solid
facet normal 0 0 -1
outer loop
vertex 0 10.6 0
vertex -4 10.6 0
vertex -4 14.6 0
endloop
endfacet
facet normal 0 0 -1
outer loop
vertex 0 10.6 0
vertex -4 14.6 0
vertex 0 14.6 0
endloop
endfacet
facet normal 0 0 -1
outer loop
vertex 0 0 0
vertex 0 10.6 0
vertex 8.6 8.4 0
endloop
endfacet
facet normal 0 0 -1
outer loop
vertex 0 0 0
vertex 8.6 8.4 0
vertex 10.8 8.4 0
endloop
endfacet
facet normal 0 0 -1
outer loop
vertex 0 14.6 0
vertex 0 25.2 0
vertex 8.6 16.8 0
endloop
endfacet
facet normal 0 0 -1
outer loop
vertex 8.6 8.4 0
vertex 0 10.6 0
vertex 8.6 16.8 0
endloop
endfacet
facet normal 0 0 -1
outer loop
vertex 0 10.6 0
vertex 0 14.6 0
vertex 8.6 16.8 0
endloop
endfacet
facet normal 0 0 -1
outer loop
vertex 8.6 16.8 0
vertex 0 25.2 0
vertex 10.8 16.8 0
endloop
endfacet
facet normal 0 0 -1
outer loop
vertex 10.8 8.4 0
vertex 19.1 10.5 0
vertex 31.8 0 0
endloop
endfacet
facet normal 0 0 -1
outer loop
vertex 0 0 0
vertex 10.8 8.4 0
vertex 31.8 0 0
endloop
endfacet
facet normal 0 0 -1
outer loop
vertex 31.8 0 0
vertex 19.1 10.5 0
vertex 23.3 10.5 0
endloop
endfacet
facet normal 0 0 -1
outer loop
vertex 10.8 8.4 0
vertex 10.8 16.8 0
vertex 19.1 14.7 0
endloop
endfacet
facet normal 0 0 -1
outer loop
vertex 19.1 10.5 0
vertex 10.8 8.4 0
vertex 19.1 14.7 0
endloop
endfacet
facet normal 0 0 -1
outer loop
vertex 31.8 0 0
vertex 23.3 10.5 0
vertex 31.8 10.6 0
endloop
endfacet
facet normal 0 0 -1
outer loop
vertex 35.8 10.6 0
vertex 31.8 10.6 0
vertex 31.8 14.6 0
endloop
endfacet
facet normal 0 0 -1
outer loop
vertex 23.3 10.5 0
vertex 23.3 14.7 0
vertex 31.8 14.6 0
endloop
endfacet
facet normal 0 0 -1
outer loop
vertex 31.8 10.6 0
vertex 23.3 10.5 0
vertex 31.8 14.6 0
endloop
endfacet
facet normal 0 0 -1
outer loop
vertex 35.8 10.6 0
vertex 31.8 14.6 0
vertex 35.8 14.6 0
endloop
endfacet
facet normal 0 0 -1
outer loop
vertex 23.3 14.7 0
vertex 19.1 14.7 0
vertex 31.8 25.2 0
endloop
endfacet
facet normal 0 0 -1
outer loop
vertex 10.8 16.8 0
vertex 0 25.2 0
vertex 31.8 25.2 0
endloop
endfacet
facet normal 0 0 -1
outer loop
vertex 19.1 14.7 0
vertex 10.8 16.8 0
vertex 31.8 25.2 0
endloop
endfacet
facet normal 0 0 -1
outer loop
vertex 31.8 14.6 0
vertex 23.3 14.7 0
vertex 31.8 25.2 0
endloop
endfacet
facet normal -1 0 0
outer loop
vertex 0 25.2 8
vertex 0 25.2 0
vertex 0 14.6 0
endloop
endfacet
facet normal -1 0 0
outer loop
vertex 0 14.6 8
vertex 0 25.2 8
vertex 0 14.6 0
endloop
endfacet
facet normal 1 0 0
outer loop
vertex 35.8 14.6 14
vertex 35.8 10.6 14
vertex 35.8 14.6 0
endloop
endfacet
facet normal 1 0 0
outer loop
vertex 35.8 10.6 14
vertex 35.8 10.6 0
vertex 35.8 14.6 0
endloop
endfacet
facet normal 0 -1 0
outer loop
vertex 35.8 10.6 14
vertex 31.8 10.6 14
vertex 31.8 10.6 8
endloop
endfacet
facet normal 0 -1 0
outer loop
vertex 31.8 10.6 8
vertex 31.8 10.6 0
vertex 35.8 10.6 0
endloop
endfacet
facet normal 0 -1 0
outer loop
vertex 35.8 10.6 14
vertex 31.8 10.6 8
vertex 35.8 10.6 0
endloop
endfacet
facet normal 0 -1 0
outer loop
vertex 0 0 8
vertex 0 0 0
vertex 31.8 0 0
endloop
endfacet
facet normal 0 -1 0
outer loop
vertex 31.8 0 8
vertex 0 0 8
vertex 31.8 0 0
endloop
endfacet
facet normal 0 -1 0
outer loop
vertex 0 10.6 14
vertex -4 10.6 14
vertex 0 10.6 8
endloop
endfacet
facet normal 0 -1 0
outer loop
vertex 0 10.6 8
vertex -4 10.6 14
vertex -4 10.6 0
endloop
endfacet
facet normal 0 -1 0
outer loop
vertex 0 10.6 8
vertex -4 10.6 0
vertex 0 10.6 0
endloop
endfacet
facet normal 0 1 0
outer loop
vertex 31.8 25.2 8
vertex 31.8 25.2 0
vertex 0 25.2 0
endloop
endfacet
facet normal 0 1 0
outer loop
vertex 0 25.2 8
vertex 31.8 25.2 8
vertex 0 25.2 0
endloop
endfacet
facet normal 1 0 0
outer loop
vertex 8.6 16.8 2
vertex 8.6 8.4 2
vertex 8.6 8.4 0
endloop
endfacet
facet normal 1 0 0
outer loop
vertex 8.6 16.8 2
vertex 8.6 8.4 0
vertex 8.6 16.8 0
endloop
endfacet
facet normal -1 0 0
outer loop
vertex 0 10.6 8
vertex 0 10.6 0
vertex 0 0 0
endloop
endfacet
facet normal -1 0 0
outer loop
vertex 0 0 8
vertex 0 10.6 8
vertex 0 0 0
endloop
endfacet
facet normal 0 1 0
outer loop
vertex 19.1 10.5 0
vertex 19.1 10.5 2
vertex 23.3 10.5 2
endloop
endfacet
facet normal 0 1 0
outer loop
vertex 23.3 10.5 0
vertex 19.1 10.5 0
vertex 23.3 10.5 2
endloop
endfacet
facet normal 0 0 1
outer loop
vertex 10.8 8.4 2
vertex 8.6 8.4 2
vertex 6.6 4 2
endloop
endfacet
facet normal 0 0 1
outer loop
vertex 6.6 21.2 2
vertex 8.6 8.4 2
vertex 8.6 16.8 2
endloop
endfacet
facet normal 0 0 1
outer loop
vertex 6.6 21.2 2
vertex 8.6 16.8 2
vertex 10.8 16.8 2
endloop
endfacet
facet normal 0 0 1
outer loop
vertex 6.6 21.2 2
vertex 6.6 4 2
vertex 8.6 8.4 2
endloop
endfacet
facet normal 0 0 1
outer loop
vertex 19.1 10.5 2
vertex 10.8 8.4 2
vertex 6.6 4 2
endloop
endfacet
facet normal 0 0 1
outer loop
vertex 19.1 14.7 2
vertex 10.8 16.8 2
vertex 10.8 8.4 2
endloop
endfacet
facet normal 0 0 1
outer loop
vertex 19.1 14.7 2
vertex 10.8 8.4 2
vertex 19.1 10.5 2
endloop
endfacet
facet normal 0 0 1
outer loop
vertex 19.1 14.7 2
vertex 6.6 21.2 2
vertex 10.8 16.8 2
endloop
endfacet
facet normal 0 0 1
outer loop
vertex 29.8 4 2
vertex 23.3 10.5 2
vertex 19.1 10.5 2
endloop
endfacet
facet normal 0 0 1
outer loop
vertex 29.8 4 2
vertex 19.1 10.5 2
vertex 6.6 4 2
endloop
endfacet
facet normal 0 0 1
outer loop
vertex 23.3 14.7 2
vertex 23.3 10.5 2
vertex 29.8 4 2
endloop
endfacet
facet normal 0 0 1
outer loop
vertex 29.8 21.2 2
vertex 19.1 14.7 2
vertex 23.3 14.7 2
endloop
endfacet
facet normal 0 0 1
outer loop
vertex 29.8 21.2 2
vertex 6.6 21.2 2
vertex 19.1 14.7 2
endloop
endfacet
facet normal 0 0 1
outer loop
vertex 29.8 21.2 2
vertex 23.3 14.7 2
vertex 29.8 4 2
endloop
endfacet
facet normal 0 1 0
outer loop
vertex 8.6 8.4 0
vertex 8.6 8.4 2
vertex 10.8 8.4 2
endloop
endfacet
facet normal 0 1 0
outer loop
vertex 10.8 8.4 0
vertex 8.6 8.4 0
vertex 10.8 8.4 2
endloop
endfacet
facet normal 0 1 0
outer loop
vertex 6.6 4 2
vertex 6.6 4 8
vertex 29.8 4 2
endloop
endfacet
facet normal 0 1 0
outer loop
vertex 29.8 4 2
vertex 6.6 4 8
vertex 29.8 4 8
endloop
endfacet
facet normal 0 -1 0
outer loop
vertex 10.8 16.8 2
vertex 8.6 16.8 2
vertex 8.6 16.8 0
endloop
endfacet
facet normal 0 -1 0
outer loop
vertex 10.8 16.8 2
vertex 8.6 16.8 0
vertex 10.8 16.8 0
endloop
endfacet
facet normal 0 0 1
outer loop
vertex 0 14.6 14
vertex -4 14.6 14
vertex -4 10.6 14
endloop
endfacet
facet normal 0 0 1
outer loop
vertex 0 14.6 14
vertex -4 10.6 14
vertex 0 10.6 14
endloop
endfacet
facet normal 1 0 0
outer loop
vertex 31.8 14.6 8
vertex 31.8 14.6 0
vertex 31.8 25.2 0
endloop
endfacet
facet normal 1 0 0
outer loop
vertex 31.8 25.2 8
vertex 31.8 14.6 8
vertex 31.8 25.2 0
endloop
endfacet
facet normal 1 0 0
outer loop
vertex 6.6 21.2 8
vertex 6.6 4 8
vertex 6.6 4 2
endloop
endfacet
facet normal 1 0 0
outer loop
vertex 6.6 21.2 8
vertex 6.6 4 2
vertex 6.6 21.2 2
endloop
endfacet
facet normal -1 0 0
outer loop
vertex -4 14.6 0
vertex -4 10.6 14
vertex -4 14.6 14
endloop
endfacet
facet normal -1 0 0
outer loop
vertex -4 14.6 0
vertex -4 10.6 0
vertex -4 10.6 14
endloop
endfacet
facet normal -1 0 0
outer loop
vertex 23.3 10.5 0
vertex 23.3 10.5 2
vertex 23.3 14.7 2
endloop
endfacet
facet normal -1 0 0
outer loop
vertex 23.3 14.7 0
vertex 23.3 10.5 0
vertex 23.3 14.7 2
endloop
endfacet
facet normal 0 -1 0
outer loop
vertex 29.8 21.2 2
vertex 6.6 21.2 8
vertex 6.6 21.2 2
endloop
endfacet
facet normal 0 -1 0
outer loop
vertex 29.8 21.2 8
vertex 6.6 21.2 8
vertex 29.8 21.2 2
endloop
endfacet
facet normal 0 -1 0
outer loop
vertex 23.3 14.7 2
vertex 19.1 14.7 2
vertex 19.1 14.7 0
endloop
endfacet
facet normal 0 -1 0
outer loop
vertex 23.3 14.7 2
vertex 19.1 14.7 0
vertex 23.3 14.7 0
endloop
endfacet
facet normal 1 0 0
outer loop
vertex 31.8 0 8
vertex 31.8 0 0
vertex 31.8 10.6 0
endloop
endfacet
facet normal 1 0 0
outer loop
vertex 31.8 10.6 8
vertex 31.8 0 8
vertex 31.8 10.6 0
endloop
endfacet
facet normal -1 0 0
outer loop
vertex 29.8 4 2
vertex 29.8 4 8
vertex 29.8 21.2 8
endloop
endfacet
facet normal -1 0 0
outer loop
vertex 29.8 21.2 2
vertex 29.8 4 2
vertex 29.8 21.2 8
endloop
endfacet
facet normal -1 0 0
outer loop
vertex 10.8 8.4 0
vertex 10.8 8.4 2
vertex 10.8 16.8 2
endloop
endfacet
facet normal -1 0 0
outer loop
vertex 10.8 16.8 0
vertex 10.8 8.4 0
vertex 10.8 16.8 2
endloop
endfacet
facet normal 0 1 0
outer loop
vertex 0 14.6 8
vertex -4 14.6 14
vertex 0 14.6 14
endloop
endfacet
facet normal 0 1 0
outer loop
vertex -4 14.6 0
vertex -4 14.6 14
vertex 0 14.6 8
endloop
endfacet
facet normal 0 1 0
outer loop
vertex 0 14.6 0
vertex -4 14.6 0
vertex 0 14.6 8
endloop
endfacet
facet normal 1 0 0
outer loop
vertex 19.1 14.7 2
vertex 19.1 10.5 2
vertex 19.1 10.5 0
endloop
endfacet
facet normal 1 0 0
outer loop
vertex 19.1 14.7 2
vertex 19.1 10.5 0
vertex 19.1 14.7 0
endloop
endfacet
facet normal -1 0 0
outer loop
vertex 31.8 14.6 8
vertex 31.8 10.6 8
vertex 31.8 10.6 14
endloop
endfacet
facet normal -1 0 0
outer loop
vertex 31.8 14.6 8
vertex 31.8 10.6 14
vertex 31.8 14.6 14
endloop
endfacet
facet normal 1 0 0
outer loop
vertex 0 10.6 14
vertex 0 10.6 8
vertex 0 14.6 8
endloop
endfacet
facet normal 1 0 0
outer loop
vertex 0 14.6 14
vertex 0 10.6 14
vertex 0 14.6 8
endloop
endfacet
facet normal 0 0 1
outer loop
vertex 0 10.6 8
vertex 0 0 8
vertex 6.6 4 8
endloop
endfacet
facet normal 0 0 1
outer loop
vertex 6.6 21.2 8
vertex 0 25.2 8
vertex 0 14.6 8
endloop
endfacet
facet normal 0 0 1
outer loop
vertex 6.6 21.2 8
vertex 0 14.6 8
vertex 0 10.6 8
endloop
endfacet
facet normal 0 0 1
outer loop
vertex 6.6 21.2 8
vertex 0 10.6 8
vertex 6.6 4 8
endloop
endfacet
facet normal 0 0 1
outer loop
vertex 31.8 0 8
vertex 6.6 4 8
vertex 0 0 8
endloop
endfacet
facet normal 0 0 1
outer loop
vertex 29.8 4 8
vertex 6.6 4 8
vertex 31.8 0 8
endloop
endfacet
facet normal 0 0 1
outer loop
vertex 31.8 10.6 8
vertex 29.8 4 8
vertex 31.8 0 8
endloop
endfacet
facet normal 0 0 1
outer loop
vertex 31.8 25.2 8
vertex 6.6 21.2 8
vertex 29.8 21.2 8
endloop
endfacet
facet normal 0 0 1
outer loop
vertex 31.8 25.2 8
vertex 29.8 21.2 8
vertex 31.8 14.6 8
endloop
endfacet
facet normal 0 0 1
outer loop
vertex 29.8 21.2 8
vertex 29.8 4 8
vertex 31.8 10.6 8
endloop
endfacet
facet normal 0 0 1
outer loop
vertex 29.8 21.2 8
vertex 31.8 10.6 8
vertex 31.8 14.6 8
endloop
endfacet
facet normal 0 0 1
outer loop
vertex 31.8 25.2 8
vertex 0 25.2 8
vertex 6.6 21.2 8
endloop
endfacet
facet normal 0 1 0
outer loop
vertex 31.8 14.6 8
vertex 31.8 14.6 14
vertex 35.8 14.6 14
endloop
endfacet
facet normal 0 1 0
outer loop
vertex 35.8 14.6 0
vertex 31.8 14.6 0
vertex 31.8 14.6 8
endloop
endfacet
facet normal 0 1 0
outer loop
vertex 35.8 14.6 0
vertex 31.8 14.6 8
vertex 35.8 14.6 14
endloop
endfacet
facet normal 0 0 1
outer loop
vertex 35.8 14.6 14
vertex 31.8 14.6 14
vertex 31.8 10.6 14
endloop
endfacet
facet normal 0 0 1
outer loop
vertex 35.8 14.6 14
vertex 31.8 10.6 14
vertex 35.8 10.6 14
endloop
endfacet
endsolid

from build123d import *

# Parameters (mm, degrees)
PAD_DEPTH       = 8
SKETCH003_W     = 23.2
SKETCH003_H     = 17.2
POCKET_DEPTH    = 6
SKETCH005_W     = 2.2
SKETCH005_H     = 8.4
POCKET001_DEPTH = 7
SKETCH006_W     = 4.2
SKETCH006_H     = 4.2
POCKET002_DEPTH = 5
SKETCH007_W     = 4
SKETCH007_H     = 4
PAD001_DEPTH    = 6
SKETCH008_W     = 4
SKETCH008_H     = 4
PAD002_DEPTH    = 6


with BuildPart() as part:
    # Sketch → Pad (new body)
    with BuildSketch(Plane.XY):
        Polygon((-4, 14.6), (-4, 10.6), (0, 10.6), (0, 0), (31.8, 0), (31.8, 10.6), (35.8, 10.6), (35.8, 14.6), (31.8, 14.6), (31.8, 25.2), (0, 25.2), (0, 14.6), align=None)
    extrude(amount=PAD_DEPTH)

    # Sketch003 (on DatumPlane) → Pocket (cut)
    with BuildSketch(Plane.XY.offset(8)):
        with Locations((18.2, 12.6)):
            Rectangle(SKETCH003_W, SKETCH003_H)
    extrude(amount=-POCKET_DEPTH, mode=Mode.SUBTRACT)

    # Sketch005 (on DatumPlane) → Pocket001 (cut)
    with BuildSketch(Plane.XY.offset(2)):
        with Locations((9.7, 12.6)):
            Rectangle(SKETCH005_W, SKETCH005_H)
    extrude(amount=-POCKET001_DEPTH, mode=Mode.SUBTRACT)

    # Sketch006 (on DatumPlane) → Pocket002 (cut)
    with BuildSketch(Plane.XY.offset(2)):
        with Locations((21.2, 12.6)):
            Rectangle(SKETCH006_W, SKETCH006_H)
    extrude(amount=-POCKET002_DEPTH, mode=Mode.SUBTRACT)

    # Sketch007 (on DatumPlane) → Pad001 (join)
    with BuildSketch(Plane.XY.offset(8)):
        with Locations((-2, 12.6)):
            Rectangle(SKETCH007_W, SKETCH007_H)
    extrude(amount=PAD001_DEPTH)

    # Sketch008 (on DatumPlane) → Pad002 (join)
    with BuildSketch(Plane.XY.offset(8)):
        with Locations((33.8, 12.6)):
            Rectangle(SKETCH008_W, SKETCH008_H)
    extrude(amount=PAD002_DEPTH)


solid = part.part
